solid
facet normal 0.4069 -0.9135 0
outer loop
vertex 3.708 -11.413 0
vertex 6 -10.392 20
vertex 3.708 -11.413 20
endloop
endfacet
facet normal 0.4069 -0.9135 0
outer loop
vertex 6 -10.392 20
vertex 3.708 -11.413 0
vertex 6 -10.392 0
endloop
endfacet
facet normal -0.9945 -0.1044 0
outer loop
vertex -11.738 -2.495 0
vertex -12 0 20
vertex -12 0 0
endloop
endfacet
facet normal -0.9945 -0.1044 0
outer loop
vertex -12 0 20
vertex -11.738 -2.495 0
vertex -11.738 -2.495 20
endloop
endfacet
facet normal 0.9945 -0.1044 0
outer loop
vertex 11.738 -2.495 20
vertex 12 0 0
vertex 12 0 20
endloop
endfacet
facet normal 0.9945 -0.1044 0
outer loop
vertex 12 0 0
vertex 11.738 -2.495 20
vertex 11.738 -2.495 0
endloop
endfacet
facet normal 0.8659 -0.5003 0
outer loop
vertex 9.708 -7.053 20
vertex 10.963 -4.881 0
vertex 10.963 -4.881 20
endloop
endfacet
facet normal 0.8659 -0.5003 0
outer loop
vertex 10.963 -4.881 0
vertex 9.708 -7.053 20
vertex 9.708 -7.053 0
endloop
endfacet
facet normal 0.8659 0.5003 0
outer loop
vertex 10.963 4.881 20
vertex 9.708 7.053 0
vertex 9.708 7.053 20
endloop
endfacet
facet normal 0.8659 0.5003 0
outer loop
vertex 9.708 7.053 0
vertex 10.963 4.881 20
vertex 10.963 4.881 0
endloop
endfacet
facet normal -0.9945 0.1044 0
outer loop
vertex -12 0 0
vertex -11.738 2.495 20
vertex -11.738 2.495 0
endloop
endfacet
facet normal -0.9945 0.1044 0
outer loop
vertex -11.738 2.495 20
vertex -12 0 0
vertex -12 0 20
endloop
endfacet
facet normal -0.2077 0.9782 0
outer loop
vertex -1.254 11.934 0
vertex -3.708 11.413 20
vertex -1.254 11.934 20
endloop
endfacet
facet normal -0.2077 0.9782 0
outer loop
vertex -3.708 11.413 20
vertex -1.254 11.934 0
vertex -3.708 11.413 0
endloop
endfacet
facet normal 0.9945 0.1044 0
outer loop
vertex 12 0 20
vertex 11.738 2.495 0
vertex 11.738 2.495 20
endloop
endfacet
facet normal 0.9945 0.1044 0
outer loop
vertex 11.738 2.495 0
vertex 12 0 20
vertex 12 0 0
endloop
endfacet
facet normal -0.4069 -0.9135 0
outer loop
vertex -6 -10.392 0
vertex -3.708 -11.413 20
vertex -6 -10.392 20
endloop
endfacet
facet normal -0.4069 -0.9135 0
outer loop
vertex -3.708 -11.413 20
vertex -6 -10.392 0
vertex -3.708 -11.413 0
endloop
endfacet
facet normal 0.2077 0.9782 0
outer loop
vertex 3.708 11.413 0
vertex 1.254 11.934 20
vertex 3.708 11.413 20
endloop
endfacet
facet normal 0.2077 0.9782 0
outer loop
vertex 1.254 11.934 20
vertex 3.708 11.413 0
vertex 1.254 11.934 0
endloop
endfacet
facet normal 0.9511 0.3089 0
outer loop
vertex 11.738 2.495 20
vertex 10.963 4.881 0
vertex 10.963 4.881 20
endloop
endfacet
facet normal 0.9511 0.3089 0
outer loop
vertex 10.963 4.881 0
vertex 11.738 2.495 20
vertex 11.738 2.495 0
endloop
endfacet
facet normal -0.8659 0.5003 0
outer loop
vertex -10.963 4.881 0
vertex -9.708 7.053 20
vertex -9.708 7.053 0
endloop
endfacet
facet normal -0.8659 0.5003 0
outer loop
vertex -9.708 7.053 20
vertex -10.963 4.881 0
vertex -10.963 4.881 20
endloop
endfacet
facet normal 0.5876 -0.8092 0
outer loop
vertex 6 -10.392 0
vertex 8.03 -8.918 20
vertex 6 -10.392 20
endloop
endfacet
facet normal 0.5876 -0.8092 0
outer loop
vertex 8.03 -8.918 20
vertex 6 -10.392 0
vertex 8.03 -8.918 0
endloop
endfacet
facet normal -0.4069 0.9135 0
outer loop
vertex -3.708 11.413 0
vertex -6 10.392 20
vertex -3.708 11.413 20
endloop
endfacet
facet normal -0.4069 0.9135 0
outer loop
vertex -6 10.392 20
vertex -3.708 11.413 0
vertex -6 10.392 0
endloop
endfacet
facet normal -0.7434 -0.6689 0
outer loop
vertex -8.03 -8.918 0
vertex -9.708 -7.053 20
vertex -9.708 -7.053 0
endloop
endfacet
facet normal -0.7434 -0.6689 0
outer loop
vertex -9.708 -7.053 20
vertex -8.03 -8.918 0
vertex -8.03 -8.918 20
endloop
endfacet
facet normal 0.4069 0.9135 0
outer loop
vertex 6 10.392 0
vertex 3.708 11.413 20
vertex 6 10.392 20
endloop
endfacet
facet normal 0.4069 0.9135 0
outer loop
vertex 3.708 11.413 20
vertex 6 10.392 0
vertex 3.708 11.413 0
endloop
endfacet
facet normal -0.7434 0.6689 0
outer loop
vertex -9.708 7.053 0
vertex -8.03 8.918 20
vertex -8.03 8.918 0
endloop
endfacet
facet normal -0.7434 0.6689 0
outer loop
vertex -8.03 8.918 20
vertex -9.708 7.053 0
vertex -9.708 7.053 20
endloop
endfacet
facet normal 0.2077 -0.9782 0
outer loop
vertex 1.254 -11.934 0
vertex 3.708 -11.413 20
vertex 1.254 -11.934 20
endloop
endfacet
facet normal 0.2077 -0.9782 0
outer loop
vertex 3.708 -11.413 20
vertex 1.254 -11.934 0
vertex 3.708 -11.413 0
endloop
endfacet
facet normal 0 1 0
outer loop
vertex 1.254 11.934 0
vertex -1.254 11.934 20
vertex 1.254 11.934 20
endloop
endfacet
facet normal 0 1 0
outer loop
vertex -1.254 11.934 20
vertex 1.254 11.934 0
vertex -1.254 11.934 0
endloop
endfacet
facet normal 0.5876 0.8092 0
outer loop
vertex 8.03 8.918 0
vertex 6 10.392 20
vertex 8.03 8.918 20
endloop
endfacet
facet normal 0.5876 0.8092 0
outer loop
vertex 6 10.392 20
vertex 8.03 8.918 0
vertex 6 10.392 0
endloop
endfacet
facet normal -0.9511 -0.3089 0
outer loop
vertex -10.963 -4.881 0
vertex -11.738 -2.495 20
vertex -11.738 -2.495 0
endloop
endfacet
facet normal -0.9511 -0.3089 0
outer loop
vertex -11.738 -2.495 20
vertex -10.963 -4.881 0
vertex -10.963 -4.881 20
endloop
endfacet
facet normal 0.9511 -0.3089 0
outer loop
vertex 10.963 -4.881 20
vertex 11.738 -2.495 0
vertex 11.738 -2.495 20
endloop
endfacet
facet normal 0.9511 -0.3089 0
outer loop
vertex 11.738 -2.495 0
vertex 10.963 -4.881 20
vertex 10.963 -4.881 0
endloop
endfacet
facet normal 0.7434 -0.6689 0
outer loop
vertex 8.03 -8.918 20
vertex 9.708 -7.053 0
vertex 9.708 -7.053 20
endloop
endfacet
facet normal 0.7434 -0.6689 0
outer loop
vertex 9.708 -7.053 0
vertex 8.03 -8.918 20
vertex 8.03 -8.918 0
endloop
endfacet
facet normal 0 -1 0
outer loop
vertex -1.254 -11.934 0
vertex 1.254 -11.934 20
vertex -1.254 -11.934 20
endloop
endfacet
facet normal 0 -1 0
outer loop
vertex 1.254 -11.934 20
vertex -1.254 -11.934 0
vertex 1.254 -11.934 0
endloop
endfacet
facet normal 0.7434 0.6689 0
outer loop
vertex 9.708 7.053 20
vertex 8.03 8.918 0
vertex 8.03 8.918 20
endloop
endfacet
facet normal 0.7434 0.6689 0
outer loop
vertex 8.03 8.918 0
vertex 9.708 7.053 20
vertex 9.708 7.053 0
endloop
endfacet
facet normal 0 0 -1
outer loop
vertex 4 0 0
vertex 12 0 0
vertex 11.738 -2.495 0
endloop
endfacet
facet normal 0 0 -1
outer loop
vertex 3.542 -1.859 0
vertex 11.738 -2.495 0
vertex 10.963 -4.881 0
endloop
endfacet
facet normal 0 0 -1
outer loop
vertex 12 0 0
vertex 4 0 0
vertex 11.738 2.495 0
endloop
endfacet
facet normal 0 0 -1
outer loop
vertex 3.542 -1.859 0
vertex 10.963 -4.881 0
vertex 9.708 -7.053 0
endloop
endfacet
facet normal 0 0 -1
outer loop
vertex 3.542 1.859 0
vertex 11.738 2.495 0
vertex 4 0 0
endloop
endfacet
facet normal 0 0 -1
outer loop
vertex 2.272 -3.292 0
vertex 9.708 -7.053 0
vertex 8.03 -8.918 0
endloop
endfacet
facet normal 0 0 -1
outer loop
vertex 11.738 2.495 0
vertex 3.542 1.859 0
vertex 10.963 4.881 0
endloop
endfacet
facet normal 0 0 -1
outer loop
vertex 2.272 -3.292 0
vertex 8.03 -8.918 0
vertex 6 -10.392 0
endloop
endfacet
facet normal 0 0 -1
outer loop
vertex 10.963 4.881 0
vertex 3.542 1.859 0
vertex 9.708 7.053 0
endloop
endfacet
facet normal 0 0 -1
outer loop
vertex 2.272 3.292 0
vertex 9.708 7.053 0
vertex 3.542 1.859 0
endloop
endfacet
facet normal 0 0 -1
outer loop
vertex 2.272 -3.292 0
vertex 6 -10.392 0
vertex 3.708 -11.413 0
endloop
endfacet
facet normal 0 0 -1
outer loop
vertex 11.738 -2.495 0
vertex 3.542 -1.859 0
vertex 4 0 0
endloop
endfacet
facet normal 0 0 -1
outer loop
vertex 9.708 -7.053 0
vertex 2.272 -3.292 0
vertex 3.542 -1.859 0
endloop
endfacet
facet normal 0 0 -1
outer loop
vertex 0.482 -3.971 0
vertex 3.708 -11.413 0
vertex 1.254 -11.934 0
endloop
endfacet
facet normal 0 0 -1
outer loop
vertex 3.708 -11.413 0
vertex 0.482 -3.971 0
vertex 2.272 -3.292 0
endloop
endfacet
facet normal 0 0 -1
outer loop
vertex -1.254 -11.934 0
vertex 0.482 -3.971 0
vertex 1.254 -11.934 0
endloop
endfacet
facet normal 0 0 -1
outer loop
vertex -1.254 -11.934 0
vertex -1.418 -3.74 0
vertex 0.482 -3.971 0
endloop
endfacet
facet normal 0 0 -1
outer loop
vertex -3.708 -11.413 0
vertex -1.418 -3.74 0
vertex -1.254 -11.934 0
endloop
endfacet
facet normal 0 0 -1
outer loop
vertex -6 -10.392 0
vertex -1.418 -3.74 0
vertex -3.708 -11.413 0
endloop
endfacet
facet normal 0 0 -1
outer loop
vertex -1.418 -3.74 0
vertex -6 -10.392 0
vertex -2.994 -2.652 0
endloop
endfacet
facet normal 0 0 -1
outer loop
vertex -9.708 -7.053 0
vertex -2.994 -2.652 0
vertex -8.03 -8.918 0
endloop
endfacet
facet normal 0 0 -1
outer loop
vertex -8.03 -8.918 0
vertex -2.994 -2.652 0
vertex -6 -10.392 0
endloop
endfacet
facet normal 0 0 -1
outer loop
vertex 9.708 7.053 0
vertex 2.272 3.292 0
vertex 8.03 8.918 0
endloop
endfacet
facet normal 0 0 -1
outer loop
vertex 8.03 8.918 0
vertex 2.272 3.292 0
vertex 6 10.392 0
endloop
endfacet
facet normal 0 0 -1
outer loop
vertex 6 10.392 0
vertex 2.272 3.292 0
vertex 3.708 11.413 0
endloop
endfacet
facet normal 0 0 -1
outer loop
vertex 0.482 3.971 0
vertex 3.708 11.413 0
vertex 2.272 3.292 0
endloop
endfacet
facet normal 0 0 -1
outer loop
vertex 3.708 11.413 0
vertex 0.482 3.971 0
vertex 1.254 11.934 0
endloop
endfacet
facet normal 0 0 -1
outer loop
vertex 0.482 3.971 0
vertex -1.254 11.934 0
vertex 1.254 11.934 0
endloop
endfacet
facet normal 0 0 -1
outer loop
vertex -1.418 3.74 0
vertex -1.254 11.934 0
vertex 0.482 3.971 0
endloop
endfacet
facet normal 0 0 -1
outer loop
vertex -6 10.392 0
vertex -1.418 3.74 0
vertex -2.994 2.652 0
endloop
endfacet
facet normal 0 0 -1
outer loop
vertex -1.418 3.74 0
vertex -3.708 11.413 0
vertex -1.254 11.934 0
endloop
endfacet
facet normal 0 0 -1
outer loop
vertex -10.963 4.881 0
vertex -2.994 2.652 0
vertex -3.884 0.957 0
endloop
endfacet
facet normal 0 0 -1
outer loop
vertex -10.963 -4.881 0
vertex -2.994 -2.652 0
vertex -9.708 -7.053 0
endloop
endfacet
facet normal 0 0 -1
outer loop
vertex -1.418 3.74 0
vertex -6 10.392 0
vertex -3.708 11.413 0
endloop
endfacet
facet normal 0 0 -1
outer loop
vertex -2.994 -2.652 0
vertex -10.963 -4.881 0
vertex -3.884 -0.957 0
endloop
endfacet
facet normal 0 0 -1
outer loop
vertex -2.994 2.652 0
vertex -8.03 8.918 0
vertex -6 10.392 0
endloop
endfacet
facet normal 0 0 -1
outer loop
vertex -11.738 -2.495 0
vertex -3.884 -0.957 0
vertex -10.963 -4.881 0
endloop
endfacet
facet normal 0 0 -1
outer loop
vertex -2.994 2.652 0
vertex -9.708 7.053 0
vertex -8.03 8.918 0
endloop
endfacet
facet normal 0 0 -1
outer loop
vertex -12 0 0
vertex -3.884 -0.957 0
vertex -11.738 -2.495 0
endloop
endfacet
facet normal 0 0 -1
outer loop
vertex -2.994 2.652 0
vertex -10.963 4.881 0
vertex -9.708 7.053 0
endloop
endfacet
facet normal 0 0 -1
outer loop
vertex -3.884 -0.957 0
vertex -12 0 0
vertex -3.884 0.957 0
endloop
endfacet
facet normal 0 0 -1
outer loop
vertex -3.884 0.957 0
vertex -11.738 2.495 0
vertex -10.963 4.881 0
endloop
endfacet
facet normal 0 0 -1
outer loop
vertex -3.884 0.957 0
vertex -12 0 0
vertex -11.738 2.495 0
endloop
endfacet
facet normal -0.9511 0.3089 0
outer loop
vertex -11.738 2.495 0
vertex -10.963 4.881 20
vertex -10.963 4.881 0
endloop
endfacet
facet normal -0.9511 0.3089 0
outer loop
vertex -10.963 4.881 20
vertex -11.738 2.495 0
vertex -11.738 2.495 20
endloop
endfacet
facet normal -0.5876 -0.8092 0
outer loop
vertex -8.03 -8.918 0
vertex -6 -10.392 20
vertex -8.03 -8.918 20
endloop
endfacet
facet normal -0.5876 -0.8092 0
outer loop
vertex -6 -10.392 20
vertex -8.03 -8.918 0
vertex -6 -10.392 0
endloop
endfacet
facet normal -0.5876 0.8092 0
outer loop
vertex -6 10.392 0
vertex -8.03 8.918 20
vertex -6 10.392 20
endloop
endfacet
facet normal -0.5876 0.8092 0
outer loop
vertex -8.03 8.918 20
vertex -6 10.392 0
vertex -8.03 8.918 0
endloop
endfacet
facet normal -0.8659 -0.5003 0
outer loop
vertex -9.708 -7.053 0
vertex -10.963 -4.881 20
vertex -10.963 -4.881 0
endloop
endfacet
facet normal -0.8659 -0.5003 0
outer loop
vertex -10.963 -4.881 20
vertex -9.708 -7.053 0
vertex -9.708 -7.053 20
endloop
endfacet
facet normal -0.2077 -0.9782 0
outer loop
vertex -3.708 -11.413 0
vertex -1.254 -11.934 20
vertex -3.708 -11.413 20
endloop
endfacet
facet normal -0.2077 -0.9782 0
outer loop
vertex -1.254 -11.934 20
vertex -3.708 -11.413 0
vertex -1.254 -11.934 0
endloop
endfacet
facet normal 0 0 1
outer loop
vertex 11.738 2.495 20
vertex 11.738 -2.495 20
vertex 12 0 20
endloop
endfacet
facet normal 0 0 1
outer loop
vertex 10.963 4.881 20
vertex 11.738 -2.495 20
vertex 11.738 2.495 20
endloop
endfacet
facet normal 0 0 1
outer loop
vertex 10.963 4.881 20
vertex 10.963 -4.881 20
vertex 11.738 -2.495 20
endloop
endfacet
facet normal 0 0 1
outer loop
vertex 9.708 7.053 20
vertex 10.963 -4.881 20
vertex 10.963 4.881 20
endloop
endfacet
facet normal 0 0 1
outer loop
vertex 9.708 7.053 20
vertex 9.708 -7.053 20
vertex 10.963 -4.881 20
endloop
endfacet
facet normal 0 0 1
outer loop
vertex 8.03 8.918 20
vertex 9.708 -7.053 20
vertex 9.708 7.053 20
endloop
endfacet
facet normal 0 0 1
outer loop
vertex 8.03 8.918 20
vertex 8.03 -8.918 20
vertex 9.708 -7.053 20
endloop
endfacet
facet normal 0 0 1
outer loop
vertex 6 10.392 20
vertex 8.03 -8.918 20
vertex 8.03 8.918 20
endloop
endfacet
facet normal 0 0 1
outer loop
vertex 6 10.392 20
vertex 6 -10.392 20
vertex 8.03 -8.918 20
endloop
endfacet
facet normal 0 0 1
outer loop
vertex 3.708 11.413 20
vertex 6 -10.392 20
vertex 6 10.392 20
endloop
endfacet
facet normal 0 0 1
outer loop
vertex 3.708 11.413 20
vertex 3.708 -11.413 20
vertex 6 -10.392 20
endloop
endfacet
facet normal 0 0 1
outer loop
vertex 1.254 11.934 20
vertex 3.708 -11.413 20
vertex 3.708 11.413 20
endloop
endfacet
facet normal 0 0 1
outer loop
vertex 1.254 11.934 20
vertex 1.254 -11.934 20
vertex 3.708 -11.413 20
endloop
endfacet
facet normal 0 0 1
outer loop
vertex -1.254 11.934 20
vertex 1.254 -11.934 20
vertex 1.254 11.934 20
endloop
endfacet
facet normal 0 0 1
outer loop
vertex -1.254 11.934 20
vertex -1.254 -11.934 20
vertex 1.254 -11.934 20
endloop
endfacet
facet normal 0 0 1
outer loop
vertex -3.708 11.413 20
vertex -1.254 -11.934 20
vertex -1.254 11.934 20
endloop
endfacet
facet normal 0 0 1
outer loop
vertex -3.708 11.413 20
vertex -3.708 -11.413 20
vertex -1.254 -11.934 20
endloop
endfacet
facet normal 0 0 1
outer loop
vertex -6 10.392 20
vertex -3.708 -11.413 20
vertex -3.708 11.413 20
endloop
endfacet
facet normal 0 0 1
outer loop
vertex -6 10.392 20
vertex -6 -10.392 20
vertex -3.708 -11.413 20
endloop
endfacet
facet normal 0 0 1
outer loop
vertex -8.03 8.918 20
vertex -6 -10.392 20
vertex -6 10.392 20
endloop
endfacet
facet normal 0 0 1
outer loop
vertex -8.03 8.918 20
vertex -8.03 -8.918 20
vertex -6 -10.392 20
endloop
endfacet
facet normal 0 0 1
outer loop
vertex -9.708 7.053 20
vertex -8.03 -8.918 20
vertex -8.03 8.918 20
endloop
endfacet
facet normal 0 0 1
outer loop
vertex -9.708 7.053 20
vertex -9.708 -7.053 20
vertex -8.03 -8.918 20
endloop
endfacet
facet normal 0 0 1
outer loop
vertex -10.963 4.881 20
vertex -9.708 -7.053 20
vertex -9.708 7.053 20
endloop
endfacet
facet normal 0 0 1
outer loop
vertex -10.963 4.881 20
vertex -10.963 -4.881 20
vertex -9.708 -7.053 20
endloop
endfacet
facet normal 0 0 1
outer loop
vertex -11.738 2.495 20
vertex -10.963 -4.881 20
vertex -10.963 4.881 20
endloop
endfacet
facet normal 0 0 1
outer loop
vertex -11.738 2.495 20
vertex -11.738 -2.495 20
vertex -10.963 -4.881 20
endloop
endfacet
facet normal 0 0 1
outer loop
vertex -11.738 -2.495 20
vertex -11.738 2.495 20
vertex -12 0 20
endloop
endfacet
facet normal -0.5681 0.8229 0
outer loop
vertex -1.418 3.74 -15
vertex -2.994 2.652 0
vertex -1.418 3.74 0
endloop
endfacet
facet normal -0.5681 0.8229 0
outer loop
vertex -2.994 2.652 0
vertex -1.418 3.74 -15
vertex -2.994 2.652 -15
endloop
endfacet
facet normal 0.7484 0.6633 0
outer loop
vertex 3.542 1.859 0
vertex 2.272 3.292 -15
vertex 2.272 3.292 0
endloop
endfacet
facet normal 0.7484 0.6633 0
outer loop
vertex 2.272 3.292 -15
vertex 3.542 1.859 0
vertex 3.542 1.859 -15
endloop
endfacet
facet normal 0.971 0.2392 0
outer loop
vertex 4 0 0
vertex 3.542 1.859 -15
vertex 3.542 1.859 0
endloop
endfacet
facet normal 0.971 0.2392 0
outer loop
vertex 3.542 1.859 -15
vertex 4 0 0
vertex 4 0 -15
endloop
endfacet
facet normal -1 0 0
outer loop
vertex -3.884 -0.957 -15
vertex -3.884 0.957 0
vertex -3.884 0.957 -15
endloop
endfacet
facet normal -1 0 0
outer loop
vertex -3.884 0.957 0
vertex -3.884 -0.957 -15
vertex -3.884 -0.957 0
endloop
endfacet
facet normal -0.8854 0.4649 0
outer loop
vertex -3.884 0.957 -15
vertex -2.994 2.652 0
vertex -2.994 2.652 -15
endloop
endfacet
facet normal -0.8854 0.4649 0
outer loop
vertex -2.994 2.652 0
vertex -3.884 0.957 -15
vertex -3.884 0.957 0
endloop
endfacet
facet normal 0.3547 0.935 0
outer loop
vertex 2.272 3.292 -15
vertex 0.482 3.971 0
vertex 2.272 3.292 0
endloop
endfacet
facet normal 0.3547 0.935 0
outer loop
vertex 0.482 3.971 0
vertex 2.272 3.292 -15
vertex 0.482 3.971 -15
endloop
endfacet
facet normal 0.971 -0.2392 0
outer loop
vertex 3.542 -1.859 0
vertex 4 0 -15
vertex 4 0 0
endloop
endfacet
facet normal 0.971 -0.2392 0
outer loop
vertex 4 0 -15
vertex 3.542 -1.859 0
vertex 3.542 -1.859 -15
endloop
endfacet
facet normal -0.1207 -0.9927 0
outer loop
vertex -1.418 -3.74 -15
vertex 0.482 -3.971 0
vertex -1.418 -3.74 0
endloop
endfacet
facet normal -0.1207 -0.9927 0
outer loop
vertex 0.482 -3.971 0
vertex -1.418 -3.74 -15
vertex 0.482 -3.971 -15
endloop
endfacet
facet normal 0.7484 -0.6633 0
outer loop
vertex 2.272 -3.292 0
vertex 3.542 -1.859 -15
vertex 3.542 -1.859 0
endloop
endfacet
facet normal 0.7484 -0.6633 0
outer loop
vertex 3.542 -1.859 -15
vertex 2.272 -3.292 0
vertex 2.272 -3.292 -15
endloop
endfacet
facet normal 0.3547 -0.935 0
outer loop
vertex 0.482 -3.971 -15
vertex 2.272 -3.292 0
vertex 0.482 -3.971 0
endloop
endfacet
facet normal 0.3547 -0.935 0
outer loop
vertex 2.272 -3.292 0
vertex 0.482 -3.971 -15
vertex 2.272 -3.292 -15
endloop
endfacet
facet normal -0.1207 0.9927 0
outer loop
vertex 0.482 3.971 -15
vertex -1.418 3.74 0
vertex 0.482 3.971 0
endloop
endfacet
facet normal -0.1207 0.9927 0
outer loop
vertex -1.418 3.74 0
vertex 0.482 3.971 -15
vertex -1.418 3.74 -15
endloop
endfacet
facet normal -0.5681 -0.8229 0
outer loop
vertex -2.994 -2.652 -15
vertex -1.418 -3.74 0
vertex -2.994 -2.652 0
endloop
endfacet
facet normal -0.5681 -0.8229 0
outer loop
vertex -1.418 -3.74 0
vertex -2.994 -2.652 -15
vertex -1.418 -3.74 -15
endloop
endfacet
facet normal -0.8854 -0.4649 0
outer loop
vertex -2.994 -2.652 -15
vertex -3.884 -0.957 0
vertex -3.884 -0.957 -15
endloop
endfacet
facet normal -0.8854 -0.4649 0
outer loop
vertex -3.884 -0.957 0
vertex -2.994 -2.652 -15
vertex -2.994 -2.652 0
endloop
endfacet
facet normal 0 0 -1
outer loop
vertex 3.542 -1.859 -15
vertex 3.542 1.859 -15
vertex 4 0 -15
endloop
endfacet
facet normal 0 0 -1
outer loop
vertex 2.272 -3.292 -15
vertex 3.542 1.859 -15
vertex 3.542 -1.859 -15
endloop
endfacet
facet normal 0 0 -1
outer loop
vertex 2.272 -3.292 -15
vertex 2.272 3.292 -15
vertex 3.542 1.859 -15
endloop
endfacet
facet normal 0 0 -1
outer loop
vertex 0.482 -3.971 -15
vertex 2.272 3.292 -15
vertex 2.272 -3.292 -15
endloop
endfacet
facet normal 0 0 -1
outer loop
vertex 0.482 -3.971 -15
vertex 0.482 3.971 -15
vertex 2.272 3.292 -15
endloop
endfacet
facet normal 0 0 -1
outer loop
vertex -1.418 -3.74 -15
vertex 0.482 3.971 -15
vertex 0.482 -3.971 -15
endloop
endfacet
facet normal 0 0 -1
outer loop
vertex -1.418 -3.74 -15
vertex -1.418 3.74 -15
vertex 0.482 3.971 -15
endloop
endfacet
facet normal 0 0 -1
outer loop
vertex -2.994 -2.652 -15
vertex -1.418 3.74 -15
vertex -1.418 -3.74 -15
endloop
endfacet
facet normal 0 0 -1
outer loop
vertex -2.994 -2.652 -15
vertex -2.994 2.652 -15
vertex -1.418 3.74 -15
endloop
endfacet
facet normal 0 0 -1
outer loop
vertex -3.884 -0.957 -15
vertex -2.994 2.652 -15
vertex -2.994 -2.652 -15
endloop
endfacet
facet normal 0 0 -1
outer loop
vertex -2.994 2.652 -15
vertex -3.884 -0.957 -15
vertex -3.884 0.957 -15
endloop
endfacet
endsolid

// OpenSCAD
// Generated by generate_scads.py
union() {
  sphere(r=2);
  union() {
    cylinder(h=20, r=12, center=false);
  }
  cylinder(h=30, r=4, center=true);
}
